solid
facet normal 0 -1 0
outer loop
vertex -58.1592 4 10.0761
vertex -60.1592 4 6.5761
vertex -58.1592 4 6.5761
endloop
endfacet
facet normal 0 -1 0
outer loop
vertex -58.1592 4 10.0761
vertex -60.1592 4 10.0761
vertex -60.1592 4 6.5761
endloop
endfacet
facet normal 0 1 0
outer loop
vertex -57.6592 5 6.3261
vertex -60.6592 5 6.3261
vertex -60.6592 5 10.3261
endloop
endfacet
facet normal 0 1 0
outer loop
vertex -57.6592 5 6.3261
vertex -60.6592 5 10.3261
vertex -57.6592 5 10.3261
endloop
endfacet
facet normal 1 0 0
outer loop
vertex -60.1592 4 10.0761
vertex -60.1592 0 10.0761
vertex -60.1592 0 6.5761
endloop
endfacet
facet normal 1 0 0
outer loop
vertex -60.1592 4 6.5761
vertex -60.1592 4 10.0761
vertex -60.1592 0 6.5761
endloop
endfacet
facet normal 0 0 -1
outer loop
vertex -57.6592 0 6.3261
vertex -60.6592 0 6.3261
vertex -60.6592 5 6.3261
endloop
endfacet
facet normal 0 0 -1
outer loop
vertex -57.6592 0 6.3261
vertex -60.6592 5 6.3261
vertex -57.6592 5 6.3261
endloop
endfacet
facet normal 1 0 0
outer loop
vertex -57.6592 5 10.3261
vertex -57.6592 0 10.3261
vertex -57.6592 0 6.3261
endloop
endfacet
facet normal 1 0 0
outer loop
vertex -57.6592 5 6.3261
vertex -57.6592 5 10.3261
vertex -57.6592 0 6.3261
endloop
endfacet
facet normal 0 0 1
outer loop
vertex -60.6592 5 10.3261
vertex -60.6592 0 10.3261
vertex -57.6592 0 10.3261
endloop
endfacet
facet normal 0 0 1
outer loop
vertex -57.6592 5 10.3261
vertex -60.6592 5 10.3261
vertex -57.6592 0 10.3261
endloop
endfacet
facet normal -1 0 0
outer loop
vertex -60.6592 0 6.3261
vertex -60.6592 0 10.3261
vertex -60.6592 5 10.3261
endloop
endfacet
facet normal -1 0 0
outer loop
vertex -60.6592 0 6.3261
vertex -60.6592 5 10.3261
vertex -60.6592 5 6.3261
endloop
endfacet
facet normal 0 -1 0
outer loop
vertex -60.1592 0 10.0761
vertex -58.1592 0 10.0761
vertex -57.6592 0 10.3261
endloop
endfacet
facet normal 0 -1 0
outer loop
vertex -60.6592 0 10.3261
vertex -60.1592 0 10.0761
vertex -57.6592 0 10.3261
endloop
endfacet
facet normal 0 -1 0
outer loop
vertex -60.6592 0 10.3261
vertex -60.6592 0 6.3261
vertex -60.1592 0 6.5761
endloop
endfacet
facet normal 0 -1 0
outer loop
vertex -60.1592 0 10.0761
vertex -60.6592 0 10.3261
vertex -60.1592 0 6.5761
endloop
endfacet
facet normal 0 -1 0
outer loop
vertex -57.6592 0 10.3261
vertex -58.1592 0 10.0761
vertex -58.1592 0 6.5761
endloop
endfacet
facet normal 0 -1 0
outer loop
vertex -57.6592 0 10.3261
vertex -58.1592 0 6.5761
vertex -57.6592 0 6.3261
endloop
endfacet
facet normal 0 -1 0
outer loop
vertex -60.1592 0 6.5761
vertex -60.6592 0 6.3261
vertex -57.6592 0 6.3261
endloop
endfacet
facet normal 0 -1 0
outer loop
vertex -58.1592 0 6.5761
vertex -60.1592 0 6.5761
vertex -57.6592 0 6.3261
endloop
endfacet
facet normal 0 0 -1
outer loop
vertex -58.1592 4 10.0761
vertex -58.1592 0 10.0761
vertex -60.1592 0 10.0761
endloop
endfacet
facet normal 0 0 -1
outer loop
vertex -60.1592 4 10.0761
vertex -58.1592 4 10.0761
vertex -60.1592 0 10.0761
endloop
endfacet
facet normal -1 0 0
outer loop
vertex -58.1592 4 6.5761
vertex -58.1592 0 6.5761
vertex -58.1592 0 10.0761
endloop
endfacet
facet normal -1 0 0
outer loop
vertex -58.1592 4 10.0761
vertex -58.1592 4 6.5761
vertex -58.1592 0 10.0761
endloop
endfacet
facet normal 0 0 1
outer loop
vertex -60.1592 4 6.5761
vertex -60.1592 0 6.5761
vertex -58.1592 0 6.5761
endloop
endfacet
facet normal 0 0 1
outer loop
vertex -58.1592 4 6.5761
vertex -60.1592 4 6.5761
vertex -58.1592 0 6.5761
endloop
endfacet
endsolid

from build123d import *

# Parameters (mm, degrees)
SKETCH_1_W          = 3
SKETCH_1_H          = 4
EXTRUDE_1_DEPTH     = 5
SKETCH_2_W          = 1
SKETCH_2_H          = 1.75
CUT_EXTRUDE_1_DEPTH = 4


with BuildPart() as part:
    # 草图1 → 凸台-拉伸1 (new body)
    with BuildSketch(Plane(origin=(0, 0, 0), x_dir=(1, 0, 0), z_dir=(0, 1, 0))):
        with Locations((-59.159150363, -8.326063526)):
            Rectangle(SKETCH_1_W, SKETCH_1_H)
    extrude(amount=EXTRUDE_1_DEPTH)

    # 草图2 → 切除-拉伸1 (cut)
    with BuildSketch(Plane.XZ):
        with Locations((-58.659150363, 9.201063526)):
            Rectangle(SKETCH_2_W, SKETCH_2_H)
        with Locations((-58.659150363, 7.451063526)):
            Rectangle(SKETCH_2_W, SKETCH_2_H)
        with Locations((-59.659150363, 7.451063526)):
            Rectangle(SKETCH_2_W, SKETCH_2_H)
        with Locations((-59.659150363, 9.201063526)):
            Rectangle(SKETCH_2_W, SKETCH_2_H)
    extrude(amount=-CUT_EXTRUDE_1_DEPTH, mode=Mode.SUBTRACT)


solid = part.part
